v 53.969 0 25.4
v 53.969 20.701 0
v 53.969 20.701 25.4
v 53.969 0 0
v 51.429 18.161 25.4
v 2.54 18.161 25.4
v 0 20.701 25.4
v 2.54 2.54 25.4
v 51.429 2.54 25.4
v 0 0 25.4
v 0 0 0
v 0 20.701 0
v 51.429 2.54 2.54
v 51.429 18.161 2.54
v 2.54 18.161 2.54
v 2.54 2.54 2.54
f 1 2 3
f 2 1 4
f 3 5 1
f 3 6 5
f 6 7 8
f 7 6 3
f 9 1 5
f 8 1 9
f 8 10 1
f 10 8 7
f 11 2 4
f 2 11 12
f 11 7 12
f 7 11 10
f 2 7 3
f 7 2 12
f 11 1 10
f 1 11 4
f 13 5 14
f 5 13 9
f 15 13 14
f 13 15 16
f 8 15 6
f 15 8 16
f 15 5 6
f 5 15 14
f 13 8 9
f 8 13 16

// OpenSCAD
/* [Model Resolution (All dimensions are in Millimeters)] */
$fn = 256;

/* [Box Container (Inside Diameter)] */
Length = 48.00; // 1.89"
Width = 14.732; // .580"
Height = 25.4; // 1.0"
Wall_Thickness = 2.54; // .100"
Fit = .889; // .035

  // Box Container No Screws 
difference(){
  cube([
    (Length +Fit+(Wall_Thickness*2)),
    (Width+Fit+(Wall_Thickness*2)),
    Height
    ],
    center=false
  );
  translate([Wall_Thickness,Wall_Thickness,Wall_Thickness]){
    cube(
      [Length+Fit,
      Width+Fit,
      Height],
      center=false
    );
  };

};
